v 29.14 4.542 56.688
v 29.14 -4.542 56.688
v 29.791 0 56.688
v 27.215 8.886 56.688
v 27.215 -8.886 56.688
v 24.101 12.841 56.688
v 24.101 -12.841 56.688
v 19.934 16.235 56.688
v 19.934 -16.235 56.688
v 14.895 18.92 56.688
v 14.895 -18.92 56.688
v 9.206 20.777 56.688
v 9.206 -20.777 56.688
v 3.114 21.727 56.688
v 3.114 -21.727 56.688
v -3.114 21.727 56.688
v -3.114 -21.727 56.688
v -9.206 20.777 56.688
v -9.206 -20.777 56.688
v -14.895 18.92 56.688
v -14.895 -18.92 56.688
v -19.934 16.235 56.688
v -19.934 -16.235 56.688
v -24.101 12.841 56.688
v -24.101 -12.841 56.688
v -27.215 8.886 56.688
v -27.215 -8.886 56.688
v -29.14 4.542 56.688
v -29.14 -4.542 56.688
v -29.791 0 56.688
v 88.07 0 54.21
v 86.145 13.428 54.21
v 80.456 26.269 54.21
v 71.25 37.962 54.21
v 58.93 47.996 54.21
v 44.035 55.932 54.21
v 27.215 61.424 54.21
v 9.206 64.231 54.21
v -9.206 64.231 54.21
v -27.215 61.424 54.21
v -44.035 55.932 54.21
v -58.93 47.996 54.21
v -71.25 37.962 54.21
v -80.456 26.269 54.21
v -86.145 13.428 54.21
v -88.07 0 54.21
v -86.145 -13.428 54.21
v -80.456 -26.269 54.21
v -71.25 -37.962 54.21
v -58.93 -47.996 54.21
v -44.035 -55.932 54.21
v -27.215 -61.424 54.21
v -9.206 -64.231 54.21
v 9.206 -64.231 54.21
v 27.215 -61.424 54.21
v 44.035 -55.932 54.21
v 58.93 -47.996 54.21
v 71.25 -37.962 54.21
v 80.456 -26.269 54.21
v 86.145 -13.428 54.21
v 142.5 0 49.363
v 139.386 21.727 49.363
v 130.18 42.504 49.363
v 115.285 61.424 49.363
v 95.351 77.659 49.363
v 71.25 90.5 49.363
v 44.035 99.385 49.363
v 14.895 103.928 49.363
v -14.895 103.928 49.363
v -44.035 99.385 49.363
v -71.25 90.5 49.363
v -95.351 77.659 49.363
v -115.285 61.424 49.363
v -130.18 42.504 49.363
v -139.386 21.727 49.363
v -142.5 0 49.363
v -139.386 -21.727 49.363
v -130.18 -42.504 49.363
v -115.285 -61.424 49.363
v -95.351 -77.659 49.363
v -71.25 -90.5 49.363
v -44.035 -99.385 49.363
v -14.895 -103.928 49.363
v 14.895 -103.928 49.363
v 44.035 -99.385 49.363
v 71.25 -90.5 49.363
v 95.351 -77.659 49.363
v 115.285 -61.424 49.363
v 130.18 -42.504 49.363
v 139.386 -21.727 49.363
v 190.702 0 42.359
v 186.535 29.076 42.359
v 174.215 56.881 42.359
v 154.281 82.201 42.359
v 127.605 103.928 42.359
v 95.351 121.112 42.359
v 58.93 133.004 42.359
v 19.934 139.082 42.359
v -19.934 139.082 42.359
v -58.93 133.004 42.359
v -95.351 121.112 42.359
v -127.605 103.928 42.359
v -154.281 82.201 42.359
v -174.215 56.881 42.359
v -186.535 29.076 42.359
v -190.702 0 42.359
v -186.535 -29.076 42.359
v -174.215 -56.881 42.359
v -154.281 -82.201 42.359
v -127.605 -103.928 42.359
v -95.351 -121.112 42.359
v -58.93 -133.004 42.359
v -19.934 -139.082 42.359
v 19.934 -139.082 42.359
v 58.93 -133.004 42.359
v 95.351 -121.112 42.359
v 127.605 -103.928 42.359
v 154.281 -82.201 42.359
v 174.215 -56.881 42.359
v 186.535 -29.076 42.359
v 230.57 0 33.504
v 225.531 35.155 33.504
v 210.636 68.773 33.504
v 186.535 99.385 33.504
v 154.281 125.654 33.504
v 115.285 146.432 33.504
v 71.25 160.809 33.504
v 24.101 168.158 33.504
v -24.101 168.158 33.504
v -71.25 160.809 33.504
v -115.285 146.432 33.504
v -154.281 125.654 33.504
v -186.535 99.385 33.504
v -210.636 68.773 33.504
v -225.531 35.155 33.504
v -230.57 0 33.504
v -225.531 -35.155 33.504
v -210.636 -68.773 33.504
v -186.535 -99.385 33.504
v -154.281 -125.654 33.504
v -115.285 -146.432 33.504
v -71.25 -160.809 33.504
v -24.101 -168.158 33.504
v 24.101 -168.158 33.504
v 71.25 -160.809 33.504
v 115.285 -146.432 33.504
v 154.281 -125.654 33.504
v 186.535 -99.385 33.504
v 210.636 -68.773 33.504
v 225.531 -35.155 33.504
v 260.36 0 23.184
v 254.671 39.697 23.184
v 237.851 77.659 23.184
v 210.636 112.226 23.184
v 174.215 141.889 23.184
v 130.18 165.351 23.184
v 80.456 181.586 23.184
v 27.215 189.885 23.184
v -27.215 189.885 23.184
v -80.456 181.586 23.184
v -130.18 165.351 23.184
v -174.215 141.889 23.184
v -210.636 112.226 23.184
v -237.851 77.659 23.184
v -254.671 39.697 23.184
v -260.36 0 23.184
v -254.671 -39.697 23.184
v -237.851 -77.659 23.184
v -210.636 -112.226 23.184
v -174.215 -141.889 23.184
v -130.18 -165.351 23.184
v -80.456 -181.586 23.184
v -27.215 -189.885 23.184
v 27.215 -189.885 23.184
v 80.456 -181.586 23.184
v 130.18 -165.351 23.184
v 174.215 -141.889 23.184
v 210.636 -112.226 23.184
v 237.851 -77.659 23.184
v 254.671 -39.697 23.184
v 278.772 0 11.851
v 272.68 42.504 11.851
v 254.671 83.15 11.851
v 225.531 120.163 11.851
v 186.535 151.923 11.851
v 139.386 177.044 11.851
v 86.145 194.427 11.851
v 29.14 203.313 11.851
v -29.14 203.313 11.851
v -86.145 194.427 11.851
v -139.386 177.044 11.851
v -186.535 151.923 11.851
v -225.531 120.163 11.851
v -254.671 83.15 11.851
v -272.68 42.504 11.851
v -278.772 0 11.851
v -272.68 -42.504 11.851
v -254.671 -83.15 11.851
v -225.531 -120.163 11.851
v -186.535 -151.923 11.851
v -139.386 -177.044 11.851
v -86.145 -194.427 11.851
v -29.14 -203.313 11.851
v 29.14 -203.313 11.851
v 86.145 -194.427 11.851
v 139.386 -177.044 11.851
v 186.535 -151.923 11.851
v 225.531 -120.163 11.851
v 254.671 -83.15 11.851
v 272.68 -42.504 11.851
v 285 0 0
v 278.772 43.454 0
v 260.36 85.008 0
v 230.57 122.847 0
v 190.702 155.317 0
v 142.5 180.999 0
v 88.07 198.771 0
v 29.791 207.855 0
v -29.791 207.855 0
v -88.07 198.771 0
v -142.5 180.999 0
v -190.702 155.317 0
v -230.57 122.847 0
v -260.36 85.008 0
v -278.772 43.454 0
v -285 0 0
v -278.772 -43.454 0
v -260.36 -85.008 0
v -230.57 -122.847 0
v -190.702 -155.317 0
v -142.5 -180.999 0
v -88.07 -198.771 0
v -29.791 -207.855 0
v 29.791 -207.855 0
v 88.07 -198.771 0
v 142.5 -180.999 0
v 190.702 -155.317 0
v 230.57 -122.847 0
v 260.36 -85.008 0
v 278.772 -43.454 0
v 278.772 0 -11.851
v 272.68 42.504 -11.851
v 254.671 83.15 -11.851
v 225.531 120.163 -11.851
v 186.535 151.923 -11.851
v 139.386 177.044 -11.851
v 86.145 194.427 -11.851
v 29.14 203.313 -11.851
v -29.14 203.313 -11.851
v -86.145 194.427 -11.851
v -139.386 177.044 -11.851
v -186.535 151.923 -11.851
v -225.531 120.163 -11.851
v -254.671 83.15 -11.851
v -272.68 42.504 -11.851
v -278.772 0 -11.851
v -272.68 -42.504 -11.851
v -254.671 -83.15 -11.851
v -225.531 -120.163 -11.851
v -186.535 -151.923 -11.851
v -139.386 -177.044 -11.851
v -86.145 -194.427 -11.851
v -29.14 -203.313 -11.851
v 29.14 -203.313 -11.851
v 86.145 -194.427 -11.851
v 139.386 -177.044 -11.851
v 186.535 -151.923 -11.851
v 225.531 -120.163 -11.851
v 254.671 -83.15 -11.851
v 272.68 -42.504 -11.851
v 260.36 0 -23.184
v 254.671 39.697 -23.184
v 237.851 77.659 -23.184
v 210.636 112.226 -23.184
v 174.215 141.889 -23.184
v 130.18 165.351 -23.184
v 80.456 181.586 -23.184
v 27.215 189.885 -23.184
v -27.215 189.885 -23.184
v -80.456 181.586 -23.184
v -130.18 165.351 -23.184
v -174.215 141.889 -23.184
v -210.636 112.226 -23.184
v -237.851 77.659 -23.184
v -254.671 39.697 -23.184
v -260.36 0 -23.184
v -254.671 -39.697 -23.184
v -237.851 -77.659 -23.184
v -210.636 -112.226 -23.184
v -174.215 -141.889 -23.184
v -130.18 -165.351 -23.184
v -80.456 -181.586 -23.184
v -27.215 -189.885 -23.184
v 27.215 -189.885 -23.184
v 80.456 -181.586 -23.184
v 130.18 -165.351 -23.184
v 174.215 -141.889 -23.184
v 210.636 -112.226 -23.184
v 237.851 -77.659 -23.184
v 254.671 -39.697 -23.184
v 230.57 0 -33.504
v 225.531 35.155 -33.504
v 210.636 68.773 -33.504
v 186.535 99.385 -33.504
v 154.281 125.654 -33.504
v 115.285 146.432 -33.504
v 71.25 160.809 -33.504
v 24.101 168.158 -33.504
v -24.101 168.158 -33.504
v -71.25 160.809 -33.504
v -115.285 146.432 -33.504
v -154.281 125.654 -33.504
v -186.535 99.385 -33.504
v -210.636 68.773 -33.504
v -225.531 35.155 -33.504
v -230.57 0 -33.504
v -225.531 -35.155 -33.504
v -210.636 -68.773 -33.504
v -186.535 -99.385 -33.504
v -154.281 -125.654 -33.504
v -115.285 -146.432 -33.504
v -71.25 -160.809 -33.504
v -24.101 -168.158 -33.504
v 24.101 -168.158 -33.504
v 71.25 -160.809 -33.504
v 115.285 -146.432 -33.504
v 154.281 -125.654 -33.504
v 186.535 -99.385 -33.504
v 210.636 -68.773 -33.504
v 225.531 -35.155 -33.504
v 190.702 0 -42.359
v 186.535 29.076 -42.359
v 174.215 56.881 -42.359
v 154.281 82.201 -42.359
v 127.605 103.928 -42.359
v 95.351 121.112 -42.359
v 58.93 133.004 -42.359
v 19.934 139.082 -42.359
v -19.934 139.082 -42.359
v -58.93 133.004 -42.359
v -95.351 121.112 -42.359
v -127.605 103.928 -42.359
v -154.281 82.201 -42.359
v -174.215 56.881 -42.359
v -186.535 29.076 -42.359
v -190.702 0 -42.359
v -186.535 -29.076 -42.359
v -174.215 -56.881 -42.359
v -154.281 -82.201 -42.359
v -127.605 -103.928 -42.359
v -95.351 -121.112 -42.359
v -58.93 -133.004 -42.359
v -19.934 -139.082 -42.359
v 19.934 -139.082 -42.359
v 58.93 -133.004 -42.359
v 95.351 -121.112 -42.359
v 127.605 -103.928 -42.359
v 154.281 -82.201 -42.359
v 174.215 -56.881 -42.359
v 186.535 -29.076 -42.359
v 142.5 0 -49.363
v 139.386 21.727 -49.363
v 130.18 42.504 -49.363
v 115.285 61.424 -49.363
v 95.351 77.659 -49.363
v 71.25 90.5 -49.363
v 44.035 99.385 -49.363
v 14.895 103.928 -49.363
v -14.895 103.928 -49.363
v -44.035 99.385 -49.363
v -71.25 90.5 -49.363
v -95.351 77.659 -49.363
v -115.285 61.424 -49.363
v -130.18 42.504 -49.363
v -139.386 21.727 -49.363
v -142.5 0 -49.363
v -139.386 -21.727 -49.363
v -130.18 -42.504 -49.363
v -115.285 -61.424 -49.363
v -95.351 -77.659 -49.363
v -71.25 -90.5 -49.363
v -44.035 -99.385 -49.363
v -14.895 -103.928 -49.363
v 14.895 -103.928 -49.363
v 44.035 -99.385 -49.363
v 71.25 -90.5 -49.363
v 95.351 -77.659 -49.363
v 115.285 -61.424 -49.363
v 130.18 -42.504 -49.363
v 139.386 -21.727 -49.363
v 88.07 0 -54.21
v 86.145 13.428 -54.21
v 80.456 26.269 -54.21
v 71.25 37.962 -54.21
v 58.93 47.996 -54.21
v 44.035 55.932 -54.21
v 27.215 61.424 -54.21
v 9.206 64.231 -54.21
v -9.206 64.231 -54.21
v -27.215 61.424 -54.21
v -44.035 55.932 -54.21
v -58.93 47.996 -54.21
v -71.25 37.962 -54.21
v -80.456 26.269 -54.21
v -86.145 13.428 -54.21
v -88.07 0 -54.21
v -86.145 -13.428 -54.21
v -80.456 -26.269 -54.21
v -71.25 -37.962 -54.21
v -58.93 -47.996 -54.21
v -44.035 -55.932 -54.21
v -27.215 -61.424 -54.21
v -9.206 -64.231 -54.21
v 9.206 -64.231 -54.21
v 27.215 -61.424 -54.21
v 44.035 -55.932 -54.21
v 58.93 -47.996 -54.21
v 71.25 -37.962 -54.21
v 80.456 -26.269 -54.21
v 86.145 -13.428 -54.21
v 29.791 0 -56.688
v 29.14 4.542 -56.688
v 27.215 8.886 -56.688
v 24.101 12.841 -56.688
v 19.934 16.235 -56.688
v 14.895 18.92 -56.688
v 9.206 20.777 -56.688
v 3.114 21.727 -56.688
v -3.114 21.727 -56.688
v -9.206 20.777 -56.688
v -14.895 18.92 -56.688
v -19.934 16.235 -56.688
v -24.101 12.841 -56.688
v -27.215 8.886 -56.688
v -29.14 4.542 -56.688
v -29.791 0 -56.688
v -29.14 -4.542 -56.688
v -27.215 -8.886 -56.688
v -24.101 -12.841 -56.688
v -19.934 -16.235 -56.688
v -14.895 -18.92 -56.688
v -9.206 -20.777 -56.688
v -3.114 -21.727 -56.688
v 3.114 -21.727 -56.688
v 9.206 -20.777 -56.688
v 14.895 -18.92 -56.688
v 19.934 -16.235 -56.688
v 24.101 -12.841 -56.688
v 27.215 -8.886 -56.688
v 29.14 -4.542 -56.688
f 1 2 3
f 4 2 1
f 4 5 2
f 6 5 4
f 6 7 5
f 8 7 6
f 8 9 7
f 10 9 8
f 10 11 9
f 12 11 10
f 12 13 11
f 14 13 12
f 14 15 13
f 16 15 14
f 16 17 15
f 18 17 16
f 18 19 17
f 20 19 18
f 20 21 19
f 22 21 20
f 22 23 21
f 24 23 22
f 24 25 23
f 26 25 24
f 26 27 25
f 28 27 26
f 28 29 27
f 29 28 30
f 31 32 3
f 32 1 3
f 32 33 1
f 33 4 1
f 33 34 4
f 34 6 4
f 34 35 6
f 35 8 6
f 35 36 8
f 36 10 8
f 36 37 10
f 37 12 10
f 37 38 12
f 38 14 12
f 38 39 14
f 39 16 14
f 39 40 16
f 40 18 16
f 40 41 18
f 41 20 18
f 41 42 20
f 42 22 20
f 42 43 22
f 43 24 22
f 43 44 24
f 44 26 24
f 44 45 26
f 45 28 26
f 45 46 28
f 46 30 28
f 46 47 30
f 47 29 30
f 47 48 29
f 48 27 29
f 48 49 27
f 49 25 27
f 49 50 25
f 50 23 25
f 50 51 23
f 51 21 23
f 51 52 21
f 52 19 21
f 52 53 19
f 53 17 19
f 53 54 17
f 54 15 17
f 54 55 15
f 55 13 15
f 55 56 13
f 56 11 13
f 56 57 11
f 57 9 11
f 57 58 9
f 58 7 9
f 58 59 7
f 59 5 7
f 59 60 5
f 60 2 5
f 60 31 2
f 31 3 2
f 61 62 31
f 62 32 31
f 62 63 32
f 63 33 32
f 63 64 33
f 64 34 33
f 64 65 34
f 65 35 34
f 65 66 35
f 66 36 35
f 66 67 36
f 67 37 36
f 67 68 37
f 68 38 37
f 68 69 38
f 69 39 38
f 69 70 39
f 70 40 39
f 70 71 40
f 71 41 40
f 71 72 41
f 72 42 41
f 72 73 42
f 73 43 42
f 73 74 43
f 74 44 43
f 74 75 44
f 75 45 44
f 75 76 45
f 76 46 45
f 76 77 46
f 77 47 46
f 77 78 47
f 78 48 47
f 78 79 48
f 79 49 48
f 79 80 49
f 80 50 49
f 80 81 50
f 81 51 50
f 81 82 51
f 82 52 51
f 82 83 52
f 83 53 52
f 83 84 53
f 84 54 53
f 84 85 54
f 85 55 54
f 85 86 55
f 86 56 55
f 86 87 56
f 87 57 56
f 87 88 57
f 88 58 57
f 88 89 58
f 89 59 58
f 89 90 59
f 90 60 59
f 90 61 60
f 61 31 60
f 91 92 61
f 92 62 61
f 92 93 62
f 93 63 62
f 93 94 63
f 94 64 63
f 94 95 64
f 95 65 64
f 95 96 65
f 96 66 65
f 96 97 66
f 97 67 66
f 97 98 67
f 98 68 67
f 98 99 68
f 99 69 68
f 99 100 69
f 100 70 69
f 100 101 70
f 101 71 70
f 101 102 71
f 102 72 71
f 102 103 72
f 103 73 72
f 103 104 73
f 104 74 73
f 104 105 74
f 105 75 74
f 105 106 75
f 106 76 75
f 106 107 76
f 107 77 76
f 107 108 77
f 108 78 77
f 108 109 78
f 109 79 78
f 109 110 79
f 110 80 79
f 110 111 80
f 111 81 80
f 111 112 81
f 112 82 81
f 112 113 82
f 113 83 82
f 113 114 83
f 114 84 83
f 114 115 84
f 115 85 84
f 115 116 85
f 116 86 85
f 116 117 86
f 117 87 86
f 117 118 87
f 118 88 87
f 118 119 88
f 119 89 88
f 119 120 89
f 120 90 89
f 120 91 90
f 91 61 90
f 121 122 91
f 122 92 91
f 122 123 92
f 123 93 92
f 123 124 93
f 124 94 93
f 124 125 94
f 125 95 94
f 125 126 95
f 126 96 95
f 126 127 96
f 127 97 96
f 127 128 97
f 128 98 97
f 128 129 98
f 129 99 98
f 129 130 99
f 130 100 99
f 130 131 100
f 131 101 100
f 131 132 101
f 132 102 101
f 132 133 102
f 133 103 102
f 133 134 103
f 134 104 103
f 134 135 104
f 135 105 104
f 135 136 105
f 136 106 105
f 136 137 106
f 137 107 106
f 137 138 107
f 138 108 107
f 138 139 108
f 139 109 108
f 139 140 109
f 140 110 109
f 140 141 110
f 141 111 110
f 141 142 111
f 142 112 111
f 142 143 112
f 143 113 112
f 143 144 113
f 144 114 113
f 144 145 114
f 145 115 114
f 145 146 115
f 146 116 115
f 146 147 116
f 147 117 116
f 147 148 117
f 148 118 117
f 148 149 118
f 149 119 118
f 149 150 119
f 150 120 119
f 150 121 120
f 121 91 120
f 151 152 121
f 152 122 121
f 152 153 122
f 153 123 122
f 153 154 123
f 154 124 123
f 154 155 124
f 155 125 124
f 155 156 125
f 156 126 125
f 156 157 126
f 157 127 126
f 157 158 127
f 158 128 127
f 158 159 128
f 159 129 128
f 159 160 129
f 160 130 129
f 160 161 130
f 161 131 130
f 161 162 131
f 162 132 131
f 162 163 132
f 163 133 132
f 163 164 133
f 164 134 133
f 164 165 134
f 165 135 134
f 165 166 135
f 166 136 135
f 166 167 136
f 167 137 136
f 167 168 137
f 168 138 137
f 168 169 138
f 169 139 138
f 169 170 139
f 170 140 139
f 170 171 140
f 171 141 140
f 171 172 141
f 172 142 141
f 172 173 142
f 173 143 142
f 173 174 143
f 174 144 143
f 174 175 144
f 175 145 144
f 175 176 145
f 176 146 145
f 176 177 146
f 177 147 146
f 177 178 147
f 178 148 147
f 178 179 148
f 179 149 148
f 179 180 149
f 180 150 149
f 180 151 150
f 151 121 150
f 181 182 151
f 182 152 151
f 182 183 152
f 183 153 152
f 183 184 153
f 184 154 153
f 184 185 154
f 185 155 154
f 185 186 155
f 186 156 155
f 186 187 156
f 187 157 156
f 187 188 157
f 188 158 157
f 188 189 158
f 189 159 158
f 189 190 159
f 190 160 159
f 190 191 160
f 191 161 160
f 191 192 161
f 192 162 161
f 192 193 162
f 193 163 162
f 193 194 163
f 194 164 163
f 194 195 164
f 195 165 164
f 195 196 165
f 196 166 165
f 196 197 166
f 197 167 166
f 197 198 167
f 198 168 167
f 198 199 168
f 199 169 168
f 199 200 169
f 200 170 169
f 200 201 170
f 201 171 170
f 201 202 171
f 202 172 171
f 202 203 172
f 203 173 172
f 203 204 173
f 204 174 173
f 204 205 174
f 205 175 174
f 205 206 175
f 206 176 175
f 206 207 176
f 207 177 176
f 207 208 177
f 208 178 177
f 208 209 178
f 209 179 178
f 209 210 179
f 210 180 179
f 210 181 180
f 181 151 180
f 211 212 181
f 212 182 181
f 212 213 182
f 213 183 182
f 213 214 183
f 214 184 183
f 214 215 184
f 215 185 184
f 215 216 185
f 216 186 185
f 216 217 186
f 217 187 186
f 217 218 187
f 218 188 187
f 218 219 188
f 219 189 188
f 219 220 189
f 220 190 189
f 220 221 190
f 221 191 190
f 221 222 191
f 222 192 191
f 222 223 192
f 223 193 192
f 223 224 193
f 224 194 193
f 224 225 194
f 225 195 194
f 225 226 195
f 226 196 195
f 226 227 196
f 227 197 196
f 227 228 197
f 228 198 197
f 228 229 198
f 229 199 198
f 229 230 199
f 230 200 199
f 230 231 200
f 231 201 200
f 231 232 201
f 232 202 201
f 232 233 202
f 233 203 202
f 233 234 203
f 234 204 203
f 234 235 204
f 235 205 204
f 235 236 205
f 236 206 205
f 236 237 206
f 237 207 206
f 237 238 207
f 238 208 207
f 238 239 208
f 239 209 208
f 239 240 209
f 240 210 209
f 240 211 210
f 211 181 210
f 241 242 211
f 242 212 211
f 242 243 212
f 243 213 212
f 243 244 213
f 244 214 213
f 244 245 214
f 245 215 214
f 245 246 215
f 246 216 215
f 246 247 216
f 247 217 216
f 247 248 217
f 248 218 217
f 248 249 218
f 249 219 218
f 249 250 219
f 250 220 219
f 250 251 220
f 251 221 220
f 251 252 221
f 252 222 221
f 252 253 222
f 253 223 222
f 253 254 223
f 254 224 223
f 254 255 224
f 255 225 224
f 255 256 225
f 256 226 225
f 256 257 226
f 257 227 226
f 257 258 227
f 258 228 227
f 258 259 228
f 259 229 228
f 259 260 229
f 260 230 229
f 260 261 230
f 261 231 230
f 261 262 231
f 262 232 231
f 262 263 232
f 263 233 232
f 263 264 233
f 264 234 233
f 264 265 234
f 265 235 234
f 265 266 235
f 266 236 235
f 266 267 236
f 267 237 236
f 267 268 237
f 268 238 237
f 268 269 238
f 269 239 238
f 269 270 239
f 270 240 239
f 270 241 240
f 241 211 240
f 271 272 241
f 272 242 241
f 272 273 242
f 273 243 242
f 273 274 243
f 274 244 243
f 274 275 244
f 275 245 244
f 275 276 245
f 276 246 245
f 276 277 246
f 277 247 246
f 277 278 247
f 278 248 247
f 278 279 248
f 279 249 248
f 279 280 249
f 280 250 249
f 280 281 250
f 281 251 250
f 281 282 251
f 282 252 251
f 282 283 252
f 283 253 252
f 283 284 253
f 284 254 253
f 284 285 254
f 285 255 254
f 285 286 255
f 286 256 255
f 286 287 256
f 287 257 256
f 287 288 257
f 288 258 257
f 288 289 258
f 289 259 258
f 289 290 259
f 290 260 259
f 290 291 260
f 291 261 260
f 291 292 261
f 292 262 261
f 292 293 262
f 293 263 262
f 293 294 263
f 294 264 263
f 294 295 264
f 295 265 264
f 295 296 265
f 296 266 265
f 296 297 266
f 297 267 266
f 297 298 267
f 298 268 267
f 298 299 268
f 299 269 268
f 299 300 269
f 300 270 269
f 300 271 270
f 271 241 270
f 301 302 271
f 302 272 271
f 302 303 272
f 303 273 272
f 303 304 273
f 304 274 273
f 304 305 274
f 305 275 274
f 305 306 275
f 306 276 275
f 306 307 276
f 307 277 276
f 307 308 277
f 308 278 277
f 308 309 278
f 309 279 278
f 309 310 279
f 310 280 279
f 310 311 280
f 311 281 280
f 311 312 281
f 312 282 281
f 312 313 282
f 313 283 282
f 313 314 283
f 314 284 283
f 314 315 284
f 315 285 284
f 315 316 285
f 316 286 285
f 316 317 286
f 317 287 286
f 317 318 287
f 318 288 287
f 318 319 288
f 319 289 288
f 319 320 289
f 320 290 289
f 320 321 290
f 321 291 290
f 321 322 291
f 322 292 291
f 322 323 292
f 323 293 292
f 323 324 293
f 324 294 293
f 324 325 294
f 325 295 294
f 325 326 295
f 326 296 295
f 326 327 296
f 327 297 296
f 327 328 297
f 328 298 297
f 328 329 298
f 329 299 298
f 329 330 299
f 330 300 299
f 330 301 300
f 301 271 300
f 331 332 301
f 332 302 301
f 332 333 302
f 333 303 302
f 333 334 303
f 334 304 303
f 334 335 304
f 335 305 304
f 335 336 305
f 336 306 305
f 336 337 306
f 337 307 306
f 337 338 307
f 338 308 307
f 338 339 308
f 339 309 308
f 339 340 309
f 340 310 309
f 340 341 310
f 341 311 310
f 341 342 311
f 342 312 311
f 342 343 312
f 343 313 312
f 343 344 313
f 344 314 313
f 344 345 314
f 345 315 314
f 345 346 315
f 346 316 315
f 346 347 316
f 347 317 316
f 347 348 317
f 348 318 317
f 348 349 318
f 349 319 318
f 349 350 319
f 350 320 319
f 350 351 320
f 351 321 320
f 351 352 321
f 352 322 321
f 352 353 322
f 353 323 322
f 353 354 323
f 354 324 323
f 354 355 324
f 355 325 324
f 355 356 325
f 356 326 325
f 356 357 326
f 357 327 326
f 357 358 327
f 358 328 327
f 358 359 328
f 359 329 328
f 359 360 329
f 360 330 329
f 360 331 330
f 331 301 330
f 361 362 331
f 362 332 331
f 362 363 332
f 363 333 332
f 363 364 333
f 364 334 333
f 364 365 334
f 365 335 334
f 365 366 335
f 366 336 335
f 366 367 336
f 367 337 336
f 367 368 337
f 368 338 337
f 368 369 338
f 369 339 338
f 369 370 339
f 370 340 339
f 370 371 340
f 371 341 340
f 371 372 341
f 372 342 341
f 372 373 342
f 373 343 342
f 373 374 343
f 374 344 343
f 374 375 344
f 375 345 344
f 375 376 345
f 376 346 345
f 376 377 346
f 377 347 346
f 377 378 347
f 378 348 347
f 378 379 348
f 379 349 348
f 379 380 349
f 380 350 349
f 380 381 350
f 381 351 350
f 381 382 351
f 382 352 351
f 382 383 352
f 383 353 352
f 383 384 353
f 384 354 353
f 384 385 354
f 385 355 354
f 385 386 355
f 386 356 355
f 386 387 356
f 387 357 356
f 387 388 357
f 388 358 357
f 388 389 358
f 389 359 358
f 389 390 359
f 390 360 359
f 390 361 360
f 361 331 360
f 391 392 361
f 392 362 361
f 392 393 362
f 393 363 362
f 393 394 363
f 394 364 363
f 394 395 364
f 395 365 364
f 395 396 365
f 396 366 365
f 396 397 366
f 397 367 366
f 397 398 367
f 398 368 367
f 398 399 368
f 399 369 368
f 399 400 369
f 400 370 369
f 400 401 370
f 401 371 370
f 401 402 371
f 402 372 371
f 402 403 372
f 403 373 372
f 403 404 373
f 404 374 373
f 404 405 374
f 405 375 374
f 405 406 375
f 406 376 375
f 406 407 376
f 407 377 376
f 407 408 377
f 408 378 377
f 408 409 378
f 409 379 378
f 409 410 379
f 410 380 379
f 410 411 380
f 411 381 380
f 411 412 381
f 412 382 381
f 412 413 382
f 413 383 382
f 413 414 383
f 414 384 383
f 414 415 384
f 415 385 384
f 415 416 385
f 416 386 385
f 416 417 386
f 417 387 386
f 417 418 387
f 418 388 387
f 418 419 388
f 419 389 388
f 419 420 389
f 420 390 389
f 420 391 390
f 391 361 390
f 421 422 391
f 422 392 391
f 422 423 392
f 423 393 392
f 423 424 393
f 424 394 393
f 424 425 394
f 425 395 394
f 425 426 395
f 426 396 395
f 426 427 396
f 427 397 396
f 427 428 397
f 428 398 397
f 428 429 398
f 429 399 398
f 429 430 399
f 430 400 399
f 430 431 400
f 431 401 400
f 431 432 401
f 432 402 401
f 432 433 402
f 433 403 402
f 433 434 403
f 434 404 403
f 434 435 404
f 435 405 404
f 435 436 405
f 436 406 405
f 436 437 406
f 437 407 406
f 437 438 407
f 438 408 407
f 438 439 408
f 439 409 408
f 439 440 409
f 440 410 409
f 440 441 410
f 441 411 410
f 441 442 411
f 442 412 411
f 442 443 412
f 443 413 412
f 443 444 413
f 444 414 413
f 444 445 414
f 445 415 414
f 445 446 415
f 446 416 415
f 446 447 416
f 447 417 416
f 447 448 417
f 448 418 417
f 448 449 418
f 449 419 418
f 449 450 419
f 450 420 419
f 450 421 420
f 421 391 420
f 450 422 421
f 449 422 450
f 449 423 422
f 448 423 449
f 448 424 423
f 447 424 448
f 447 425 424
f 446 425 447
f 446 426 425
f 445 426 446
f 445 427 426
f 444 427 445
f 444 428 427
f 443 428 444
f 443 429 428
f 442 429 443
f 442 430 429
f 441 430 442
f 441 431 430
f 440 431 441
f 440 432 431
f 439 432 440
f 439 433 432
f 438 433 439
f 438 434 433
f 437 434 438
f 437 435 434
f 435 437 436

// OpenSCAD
// Generated by SolidPython 1.0.1 on 2020-07-29 00:46:52


scale(v = [15, 11, 3]) {
	sphere(r = 19);
}
/***********************************************
*********      SolidPython code:      **********
************************************************
 
# import packages: SolidPython
from solid import *
from solid.utils import *
from itertools import chain, combinations, permutations


class Resize:

    def __init__(self, scad_file):
        self.scad_file = scad_file
        #self.scad_file = import_scad(scad_file)
        # cone/cylinder param:
        self.r1 = 0
        self.r2 = 0
        self.h = 0
        # rectangular prism param:
        self.w = 0
        self.l = 0
        # ellipse param:
        self.r = 0

    # import OpenScad code (file name corresponds to shape)


    # classify shape + parameters
    def assign(self, param1, param2, param3):
        if self.scad_file == 'cone.scad':
            self.r1 = param1
            self.r2 = param2
            self.h = param3
        elif self.scad_file == 'cylinder.scad':
            self.r1 = param1
            self.r2 = param2
            self.h = param3
        elif self.scad_file == 'rectangularPrism.scad':
            self.h = param1
            self.l = param2
            self.w = param3
        else:
            self.r = param1
            self.h = param2

    # resize parameters
    def iterate(self):
        x = range(3, 20, 2)
        i = 1
        if self.scad_file == 'cone.scad':
            tempList = list(permutations(x, 2))
            for temp in tempList:
                param1 = temp[0]
                param2 = temp[1]
                filepath = 'produced_scad_files/' + 'cone' + str(param1) + '_' + str(param2) + '_' + '.scad'
                scad_render_to_file(cylinder(h=param1, r1=param2, r2=0), filepath)

        elif self.scad_file == 'cylinder.scad':
            tempList = list(permutations(x, 3))
            for temp in tempList:
                param1 = temp[0]
                param2 = temp[1]
                filepath = 'produced_scad_files/' + 'cylinder' + str(param1) + '_' + str(param2) + '_' + '.scad'
                scad_render_to_file(cylinder(h=param1, r1=param2, r2=param2), filepath)

        elif self.scad_file == 'rectangularPrism.scad':
            tempList = list(permutations(x, 3))
            for temp in tempList:
                param1 = temp[0]
                param2 = temp[1]
                param3 = temp[2]
                filepath = 'produced_scad_files/' + 'rectangularPrism' + str(param1) + '_' + str(param2) + '_' + str(
                    param3) + '.scad'
                scad_render_to_file(cube(size=(param1, param2, param3)), filepath)

        elif self.scad_file == 'ellipse.scad':
            tempList = list(permutations(x, 4))
            for temp in tempList:
                param1 = temp[0]
                param2 = temp[1]
                param3 = temp[2]
                param4 = temp[3]
                filepath = 'produced_scad_files/' + 'ellipse' + str(param1) + '_' + str(param2) + '_' + str(param3) + '_' + str(param4) + '.scad'
                scad_render_to_file(scale([param1, param2, param3])(sphere(r=param4)), filepath)

    def render_to_scadfile(self):
        scad_render_to_file(scad, 'example.scad') 
 
************************************************/
